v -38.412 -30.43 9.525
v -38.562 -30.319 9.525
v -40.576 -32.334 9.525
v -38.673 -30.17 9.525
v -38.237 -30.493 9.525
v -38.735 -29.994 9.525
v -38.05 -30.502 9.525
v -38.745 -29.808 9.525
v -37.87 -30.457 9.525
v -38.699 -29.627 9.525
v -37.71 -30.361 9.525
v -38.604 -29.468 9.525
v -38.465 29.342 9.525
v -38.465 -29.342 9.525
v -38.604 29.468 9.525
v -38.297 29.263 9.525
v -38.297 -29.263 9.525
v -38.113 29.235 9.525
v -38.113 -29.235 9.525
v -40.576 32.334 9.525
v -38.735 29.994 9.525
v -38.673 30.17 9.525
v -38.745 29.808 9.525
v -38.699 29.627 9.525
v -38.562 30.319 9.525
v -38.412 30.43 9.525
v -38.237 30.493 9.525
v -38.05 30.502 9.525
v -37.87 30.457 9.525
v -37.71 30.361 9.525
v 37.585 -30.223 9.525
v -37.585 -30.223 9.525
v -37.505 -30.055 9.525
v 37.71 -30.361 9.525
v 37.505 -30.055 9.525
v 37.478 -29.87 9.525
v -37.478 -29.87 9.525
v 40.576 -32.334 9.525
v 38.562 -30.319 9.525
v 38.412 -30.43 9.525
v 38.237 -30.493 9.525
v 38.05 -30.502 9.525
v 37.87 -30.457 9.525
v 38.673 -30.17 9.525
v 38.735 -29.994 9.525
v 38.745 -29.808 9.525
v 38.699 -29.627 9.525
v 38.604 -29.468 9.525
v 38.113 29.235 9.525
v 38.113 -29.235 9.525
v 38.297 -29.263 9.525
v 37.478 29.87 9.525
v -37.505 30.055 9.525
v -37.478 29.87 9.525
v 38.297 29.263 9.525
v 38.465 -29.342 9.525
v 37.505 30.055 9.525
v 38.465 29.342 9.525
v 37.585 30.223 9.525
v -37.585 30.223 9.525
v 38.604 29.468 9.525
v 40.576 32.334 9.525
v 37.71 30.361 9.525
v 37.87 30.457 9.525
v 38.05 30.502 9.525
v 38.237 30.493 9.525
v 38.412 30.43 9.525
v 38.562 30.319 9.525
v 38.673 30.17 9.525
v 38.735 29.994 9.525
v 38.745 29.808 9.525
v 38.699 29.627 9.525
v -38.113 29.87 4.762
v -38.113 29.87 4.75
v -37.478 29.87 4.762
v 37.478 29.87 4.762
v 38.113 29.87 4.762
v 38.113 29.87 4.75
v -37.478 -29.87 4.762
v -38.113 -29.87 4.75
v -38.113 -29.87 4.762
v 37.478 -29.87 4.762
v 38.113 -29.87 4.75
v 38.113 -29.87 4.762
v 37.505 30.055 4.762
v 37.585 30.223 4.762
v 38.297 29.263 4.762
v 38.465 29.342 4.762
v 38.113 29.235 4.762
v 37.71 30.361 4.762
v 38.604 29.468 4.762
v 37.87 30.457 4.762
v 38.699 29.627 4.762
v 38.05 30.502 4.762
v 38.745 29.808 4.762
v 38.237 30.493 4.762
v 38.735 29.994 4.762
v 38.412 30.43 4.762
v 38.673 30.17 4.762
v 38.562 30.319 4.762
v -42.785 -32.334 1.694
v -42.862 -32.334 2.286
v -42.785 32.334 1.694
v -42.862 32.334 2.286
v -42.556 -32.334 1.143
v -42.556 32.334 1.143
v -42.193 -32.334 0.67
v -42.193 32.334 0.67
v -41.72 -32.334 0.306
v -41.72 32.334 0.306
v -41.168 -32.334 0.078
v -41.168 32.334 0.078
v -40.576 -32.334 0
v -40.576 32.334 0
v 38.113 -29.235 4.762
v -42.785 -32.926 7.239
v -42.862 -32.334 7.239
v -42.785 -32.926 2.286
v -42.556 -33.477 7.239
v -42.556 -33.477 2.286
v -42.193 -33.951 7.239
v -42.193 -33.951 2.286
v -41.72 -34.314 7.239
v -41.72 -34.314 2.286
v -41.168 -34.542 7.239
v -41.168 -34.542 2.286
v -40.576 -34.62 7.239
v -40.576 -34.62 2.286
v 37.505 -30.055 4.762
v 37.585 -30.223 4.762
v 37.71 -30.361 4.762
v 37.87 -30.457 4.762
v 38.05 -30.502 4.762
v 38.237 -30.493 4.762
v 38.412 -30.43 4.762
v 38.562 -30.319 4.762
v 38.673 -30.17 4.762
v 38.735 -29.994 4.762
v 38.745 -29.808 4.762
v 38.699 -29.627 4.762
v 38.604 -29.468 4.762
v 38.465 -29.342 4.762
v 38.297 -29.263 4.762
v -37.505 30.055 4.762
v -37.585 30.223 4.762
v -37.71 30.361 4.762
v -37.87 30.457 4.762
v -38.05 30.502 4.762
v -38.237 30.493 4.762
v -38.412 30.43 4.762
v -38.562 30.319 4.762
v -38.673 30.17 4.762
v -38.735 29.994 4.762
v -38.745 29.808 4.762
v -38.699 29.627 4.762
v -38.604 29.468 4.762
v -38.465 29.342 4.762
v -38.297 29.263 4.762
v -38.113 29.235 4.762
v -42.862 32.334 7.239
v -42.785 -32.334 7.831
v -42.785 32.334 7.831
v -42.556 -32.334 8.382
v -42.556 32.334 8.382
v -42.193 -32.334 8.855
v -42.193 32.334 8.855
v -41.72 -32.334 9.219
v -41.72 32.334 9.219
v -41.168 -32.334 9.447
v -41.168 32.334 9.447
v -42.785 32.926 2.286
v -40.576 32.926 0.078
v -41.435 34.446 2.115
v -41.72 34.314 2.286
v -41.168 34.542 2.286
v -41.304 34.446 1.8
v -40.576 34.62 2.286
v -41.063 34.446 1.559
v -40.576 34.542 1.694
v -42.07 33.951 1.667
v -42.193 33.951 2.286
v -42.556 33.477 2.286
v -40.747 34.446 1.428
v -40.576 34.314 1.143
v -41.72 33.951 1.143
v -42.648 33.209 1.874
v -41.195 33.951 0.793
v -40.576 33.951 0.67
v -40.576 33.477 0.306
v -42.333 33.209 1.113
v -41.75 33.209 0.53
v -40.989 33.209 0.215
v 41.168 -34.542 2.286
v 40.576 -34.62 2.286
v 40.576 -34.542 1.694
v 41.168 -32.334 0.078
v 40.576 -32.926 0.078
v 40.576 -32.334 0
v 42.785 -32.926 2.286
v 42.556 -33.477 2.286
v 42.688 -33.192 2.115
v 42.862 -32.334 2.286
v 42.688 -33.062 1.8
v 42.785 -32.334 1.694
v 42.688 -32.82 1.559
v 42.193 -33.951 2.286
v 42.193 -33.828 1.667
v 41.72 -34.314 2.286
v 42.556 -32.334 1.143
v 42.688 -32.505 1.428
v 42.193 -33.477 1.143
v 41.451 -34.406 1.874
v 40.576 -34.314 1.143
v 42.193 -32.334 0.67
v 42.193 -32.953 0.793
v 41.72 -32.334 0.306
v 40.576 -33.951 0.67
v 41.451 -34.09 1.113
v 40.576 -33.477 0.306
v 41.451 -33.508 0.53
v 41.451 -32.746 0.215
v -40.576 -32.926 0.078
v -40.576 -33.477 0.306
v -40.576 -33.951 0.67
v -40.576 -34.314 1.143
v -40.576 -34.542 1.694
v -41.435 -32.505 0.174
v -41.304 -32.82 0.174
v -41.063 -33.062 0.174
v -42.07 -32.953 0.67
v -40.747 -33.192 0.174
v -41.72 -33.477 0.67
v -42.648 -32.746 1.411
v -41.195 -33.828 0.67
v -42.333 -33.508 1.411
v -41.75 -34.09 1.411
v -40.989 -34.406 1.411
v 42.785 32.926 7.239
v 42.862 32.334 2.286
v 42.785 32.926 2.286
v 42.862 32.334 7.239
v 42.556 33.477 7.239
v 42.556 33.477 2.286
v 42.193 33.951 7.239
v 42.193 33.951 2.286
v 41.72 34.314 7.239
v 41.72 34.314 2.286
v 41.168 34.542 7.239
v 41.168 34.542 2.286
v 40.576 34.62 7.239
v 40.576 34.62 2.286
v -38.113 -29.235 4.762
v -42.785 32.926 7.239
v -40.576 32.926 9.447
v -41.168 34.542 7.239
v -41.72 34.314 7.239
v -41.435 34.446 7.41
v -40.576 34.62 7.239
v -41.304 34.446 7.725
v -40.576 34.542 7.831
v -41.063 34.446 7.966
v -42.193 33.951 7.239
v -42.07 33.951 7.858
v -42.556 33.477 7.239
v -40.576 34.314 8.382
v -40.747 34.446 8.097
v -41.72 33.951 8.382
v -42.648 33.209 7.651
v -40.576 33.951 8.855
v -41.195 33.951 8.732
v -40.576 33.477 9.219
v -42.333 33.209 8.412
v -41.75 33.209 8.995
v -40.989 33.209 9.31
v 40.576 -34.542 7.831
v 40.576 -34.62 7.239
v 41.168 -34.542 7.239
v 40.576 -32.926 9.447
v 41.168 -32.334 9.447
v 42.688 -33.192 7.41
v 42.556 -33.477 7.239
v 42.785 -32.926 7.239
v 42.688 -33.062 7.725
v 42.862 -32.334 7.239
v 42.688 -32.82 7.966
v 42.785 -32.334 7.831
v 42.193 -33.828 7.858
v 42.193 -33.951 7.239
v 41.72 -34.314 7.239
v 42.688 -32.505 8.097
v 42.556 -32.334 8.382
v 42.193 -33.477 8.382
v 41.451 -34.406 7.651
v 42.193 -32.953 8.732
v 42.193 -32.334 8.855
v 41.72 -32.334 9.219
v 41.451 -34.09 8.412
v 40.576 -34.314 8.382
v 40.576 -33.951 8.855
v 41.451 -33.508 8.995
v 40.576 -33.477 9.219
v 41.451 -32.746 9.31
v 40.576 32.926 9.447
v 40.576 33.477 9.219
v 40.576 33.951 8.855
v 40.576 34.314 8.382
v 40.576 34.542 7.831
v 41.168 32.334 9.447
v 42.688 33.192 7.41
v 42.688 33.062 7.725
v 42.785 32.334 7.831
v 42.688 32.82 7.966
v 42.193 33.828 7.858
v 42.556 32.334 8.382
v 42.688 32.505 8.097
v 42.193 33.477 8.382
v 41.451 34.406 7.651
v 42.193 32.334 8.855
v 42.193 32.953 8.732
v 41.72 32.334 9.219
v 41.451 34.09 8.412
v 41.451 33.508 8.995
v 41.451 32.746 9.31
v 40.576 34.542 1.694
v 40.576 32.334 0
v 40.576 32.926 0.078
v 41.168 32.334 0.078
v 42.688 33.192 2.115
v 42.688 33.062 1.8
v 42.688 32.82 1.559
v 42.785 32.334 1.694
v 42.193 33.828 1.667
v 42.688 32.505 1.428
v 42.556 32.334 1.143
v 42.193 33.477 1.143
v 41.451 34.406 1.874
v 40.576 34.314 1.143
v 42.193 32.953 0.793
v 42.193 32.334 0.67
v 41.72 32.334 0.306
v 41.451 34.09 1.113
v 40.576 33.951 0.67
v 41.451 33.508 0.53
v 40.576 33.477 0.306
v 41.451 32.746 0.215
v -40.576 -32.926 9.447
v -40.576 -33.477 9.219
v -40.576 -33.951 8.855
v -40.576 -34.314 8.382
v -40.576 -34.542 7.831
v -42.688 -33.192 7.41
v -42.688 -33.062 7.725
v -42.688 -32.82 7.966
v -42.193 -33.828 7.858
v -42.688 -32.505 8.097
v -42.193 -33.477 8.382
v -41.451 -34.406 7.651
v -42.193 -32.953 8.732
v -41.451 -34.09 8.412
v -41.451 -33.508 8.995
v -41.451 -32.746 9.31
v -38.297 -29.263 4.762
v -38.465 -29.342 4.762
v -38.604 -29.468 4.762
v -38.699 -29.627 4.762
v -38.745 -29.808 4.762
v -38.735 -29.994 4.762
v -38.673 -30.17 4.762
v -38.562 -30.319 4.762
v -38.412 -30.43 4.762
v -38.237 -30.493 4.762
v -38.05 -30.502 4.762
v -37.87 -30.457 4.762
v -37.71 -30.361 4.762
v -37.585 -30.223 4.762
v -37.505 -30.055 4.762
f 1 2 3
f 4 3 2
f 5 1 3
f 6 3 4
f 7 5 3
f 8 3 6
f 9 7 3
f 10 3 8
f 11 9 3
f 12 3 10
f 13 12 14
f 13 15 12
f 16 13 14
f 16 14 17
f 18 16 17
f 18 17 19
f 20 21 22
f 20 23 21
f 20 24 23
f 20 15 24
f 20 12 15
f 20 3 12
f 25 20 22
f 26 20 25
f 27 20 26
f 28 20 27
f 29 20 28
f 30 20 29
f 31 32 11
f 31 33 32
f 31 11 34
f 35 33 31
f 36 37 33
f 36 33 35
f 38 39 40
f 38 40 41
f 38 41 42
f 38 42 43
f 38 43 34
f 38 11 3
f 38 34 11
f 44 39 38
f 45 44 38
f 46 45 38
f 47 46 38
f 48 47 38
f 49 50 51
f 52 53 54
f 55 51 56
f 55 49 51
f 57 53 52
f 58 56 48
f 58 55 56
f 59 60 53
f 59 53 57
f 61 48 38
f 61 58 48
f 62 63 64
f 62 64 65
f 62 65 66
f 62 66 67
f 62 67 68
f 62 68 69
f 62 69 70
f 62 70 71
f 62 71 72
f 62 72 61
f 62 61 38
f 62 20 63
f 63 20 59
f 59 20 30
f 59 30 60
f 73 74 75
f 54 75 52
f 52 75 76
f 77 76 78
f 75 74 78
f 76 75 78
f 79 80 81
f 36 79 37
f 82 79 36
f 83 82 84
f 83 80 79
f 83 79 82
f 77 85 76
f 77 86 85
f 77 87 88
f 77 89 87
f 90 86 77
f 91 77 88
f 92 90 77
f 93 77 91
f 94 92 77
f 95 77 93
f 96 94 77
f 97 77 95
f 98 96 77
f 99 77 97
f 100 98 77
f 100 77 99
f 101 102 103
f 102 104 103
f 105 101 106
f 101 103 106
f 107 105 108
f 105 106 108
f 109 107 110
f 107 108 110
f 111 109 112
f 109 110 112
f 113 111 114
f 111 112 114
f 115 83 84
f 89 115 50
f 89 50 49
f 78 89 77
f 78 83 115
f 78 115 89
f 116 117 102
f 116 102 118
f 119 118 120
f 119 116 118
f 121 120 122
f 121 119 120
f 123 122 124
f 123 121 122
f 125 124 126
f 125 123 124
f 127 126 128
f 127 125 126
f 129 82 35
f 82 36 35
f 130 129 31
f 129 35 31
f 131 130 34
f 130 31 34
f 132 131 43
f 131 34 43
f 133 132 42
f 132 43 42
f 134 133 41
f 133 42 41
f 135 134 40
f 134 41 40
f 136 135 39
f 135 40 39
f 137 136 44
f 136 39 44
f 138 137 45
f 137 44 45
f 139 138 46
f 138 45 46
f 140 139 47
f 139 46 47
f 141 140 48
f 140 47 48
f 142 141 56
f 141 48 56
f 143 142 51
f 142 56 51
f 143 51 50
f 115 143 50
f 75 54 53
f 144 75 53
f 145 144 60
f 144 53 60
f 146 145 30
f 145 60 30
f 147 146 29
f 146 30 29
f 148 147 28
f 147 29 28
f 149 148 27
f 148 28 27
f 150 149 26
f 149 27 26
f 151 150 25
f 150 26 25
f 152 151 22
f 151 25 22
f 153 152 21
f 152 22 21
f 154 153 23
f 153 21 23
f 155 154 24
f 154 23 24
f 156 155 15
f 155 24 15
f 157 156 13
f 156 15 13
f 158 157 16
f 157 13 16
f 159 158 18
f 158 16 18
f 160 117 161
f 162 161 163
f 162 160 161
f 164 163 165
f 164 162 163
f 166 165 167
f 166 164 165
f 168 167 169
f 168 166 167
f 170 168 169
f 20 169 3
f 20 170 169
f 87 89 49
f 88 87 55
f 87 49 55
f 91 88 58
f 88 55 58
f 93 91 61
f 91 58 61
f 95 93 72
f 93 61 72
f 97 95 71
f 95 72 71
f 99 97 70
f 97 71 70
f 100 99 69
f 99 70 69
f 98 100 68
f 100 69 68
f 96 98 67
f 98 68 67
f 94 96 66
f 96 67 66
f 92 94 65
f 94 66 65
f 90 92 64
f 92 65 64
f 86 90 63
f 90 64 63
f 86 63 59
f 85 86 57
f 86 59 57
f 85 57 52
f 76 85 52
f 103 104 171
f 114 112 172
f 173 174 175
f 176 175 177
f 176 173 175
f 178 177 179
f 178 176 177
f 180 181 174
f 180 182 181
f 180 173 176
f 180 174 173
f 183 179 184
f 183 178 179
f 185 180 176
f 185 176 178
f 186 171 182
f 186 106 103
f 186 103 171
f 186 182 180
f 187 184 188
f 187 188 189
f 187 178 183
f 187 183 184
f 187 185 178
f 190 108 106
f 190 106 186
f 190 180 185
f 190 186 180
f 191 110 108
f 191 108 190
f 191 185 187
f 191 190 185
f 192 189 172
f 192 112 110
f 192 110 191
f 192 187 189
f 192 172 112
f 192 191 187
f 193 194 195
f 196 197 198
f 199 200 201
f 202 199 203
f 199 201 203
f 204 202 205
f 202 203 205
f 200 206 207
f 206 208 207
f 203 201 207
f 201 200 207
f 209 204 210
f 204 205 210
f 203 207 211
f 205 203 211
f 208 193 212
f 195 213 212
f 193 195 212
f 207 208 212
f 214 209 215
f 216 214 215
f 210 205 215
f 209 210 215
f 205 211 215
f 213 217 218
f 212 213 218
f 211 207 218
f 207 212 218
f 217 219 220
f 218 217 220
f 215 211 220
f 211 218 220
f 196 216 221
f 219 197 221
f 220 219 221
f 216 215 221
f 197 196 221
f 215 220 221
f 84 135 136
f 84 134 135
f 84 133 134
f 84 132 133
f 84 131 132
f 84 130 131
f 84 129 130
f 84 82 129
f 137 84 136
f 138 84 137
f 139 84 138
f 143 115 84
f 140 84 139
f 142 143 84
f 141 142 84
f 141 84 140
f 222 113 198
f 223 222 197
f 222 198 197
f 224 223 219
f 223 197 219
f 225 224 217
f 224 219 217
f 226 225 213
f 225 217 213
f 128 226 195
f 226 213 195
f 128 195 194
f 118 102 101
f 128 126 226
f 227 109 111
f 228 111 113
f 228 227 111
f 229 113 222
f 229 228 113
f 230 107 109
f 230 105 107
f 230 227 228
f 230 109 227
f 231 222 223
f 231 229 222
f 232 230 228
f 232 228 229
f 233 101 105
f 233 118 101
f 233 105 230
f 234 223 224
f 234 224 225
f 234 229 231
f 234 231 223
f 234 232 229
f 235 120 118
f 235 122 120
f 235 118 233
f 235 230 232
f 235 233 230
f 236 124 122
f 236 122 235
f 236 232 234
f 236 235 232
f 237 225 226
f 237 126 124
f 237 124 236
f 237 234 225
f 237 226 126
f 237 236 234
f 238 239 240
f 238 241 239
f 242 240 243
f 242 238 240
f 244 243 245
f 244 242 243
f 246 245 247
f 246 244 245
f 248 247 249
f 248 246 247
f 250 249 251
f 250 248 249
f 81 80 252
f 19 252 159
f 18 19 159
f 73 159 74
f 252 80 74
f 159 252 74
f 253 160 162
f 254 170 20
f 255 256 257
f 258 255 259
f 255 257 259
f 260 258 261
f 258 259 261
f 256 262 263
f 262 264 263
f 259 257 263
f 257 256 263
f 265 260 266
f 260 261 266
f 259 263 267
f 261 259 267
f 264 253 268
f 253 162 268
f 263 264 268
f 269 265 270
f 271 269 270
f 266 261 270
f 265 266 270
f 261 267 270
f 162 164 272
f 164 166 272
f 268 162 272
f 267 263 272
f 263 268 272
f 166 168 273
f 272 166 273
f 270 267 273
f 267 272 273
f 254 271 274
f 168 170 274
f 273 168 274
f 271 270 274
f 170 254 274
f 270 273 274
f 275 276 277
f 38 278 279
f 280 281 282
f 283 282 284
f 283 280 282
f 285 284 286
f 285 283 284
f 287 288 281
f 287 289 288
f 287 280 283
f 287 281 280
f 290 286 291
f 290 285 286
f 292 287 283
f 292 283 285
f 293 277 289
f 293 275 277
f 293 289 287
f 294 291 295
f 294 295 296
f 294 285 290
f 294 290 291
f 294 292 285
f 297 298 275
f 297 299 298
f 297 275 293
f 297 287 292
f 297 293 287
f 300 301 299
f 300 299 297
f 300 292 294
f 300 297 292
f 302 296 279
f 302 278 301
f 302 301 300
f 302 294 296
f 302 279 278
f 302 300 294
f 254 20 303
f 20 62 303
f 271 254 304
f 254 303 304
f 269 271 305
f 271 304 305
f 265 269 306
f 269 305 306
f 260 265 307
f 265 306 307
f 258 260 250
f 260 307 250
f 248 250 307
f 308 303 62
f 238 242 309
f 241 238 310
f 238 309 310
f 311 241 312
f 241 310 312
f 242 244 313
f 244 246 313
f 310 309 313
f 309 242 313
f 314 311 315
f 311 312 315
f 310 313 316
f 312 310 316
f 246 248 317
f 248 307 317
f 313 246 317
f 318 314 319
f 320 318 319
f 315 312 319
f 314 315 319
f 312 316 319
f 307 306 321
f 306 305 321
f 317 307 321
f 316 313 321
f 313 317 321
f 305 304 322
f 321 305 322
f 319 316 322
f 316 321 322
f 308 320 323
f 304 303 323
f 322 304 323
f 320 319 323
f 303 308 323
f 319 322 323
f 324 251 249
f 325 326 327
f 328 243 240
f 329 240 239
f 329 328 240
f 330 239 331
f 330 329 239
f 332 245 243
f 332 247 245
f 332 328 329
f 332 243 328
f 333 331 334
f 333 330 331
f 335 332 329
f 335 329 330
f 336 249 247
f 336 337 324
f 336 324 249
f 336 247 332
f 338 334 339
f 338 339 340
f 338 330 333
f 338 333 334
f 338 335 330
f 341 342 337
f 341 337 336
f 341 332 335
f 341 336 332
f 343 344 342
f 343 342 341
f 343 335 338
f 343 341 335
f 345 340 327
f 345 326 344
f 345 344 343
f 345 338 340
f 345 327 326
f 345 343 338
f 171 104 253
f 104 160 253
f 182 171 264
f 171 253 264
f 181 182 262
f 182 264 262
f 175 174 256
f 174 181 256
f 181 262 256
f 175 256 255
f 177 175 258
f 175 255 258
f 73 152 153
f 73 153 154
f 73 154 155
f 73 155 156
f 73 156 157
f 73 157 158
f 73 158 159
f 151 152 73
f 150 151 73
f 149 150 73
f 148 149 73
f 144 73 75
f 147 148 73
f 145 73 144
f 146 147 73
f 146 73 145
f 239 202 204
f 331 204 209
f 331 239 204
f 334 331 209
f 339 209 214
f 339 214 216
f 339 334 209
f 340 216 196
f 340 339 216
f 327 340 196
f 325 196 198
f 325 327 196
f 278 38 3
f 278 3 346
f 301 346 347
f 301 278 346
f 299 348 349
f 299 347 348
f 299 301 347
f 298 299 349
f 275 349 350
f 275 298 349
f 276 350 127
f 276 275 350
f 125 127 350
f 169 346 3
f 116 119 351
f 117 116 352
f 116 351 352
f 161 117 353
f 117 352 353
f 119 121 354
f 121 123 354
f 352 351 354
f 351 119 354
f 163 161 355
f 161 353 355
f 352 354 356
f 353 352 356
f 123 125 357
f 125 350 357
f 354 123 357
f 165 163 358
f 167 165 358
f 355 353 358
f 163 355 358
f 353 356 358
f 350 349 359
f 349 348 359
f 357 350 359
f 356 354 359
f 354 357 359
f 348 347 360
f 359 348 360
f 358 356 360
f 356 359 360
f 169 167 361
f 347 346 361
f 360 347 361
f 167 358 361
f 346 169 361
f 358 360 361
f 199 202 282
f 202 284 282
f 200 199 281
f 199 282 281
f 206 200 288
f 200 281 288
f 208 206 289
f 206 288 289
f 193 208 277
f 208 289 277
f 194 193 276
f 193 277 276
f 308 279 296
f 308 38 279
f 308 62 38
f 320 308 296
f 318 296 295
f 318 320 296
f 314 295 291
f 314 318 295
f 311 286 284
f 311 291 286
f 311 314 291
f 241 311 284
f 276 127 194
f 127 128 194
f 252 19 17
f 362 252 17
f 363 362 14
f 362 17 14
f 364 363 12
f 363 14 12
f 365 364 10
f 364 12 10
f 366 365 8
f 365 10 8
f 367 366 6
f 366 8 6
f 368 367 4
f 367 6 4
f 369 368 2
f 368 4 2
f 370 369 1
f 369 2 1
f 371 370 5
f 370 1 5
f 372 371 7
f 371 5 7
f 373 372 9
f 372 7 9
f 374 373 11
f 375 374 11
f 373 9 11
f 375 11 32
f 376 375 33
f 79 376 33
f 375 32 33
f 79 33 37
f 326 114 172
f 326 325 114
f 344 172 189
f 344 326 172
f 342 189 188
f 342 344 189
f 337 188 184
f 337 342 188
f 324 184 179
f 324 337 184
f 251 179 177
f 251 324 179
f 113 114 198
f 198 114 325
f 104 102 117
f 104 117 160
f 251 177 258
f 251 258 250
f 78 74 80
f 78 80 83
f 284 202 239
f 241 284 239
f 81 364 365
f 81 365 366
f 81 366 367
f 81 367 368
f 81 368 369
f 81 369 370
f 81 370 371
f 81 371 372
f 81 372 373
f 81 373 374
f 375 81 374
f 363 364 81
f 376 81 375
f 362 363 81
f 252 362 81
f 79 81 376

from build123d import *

# Parameters (mm, degrees)
F0_W     = 85.725
F0_H     = 69.2404
F1_DEPTH = 9.525
F2_T     = -4.7498
F3_R     = 0.635
F4_DEPTH = 4.7625
F5_R     = 2.286


with BuildPart() as f1:
    # F0 (on Top) → F1 (new body)
    with BuildSketch(Plane.XY):
        Rectangle(F0_W, F0_H)
    extrude(amount=F1_DEPTH)

    # F2
    f2_openings = [f1.faces().sort_by_distance(p)[0] for p in [
        (0, 0, 9.525),
    ]]
    offset(amount=F2_T, openings=f2_openings)

    # F3 (on face) → F4 (cut)
    with BuildSketch(Plane.XY.offset(9.525)):
        with Locations((-38.1127, 29.8704)):
            Circle(F3_R)
        with Locations((38.1127, 29.8704)):
            Circle(F3_R)
        with Locations((38.1127, -29.8704)):
            Circle(F3_R)
        with Locations((-38.1127, -29.8704)):
            Circle(F3_R)
    extrude(amount=-F4_DEPTH, mode=Mode.SUBTRACT)

    # F5
    f5_edges = [f1.edges().sort_by_distance(p)[0] for p in [
        (0, -34.6202, 9.525),
        (-42.8625, -34.6202, 4.7625),
        (-42.8625, 0, 0),
        (-42.8625, 0, 9.525),
        (0, -34.6202, 0),
        (42.8625, -34.6202, 4.7625),
        (-42.8625, 34.6202, 4.7625),
        (0, 34.6202, 9.525),
        (0, 34.6202, 0),
        (42.8625, 34.6202, 4.7625),
        (42.8625, 0, 9.525),
        (42.8625, 0, 0),
    ]]
    fillet(f5_edges, radius=F5_R)


solid = f1.part
